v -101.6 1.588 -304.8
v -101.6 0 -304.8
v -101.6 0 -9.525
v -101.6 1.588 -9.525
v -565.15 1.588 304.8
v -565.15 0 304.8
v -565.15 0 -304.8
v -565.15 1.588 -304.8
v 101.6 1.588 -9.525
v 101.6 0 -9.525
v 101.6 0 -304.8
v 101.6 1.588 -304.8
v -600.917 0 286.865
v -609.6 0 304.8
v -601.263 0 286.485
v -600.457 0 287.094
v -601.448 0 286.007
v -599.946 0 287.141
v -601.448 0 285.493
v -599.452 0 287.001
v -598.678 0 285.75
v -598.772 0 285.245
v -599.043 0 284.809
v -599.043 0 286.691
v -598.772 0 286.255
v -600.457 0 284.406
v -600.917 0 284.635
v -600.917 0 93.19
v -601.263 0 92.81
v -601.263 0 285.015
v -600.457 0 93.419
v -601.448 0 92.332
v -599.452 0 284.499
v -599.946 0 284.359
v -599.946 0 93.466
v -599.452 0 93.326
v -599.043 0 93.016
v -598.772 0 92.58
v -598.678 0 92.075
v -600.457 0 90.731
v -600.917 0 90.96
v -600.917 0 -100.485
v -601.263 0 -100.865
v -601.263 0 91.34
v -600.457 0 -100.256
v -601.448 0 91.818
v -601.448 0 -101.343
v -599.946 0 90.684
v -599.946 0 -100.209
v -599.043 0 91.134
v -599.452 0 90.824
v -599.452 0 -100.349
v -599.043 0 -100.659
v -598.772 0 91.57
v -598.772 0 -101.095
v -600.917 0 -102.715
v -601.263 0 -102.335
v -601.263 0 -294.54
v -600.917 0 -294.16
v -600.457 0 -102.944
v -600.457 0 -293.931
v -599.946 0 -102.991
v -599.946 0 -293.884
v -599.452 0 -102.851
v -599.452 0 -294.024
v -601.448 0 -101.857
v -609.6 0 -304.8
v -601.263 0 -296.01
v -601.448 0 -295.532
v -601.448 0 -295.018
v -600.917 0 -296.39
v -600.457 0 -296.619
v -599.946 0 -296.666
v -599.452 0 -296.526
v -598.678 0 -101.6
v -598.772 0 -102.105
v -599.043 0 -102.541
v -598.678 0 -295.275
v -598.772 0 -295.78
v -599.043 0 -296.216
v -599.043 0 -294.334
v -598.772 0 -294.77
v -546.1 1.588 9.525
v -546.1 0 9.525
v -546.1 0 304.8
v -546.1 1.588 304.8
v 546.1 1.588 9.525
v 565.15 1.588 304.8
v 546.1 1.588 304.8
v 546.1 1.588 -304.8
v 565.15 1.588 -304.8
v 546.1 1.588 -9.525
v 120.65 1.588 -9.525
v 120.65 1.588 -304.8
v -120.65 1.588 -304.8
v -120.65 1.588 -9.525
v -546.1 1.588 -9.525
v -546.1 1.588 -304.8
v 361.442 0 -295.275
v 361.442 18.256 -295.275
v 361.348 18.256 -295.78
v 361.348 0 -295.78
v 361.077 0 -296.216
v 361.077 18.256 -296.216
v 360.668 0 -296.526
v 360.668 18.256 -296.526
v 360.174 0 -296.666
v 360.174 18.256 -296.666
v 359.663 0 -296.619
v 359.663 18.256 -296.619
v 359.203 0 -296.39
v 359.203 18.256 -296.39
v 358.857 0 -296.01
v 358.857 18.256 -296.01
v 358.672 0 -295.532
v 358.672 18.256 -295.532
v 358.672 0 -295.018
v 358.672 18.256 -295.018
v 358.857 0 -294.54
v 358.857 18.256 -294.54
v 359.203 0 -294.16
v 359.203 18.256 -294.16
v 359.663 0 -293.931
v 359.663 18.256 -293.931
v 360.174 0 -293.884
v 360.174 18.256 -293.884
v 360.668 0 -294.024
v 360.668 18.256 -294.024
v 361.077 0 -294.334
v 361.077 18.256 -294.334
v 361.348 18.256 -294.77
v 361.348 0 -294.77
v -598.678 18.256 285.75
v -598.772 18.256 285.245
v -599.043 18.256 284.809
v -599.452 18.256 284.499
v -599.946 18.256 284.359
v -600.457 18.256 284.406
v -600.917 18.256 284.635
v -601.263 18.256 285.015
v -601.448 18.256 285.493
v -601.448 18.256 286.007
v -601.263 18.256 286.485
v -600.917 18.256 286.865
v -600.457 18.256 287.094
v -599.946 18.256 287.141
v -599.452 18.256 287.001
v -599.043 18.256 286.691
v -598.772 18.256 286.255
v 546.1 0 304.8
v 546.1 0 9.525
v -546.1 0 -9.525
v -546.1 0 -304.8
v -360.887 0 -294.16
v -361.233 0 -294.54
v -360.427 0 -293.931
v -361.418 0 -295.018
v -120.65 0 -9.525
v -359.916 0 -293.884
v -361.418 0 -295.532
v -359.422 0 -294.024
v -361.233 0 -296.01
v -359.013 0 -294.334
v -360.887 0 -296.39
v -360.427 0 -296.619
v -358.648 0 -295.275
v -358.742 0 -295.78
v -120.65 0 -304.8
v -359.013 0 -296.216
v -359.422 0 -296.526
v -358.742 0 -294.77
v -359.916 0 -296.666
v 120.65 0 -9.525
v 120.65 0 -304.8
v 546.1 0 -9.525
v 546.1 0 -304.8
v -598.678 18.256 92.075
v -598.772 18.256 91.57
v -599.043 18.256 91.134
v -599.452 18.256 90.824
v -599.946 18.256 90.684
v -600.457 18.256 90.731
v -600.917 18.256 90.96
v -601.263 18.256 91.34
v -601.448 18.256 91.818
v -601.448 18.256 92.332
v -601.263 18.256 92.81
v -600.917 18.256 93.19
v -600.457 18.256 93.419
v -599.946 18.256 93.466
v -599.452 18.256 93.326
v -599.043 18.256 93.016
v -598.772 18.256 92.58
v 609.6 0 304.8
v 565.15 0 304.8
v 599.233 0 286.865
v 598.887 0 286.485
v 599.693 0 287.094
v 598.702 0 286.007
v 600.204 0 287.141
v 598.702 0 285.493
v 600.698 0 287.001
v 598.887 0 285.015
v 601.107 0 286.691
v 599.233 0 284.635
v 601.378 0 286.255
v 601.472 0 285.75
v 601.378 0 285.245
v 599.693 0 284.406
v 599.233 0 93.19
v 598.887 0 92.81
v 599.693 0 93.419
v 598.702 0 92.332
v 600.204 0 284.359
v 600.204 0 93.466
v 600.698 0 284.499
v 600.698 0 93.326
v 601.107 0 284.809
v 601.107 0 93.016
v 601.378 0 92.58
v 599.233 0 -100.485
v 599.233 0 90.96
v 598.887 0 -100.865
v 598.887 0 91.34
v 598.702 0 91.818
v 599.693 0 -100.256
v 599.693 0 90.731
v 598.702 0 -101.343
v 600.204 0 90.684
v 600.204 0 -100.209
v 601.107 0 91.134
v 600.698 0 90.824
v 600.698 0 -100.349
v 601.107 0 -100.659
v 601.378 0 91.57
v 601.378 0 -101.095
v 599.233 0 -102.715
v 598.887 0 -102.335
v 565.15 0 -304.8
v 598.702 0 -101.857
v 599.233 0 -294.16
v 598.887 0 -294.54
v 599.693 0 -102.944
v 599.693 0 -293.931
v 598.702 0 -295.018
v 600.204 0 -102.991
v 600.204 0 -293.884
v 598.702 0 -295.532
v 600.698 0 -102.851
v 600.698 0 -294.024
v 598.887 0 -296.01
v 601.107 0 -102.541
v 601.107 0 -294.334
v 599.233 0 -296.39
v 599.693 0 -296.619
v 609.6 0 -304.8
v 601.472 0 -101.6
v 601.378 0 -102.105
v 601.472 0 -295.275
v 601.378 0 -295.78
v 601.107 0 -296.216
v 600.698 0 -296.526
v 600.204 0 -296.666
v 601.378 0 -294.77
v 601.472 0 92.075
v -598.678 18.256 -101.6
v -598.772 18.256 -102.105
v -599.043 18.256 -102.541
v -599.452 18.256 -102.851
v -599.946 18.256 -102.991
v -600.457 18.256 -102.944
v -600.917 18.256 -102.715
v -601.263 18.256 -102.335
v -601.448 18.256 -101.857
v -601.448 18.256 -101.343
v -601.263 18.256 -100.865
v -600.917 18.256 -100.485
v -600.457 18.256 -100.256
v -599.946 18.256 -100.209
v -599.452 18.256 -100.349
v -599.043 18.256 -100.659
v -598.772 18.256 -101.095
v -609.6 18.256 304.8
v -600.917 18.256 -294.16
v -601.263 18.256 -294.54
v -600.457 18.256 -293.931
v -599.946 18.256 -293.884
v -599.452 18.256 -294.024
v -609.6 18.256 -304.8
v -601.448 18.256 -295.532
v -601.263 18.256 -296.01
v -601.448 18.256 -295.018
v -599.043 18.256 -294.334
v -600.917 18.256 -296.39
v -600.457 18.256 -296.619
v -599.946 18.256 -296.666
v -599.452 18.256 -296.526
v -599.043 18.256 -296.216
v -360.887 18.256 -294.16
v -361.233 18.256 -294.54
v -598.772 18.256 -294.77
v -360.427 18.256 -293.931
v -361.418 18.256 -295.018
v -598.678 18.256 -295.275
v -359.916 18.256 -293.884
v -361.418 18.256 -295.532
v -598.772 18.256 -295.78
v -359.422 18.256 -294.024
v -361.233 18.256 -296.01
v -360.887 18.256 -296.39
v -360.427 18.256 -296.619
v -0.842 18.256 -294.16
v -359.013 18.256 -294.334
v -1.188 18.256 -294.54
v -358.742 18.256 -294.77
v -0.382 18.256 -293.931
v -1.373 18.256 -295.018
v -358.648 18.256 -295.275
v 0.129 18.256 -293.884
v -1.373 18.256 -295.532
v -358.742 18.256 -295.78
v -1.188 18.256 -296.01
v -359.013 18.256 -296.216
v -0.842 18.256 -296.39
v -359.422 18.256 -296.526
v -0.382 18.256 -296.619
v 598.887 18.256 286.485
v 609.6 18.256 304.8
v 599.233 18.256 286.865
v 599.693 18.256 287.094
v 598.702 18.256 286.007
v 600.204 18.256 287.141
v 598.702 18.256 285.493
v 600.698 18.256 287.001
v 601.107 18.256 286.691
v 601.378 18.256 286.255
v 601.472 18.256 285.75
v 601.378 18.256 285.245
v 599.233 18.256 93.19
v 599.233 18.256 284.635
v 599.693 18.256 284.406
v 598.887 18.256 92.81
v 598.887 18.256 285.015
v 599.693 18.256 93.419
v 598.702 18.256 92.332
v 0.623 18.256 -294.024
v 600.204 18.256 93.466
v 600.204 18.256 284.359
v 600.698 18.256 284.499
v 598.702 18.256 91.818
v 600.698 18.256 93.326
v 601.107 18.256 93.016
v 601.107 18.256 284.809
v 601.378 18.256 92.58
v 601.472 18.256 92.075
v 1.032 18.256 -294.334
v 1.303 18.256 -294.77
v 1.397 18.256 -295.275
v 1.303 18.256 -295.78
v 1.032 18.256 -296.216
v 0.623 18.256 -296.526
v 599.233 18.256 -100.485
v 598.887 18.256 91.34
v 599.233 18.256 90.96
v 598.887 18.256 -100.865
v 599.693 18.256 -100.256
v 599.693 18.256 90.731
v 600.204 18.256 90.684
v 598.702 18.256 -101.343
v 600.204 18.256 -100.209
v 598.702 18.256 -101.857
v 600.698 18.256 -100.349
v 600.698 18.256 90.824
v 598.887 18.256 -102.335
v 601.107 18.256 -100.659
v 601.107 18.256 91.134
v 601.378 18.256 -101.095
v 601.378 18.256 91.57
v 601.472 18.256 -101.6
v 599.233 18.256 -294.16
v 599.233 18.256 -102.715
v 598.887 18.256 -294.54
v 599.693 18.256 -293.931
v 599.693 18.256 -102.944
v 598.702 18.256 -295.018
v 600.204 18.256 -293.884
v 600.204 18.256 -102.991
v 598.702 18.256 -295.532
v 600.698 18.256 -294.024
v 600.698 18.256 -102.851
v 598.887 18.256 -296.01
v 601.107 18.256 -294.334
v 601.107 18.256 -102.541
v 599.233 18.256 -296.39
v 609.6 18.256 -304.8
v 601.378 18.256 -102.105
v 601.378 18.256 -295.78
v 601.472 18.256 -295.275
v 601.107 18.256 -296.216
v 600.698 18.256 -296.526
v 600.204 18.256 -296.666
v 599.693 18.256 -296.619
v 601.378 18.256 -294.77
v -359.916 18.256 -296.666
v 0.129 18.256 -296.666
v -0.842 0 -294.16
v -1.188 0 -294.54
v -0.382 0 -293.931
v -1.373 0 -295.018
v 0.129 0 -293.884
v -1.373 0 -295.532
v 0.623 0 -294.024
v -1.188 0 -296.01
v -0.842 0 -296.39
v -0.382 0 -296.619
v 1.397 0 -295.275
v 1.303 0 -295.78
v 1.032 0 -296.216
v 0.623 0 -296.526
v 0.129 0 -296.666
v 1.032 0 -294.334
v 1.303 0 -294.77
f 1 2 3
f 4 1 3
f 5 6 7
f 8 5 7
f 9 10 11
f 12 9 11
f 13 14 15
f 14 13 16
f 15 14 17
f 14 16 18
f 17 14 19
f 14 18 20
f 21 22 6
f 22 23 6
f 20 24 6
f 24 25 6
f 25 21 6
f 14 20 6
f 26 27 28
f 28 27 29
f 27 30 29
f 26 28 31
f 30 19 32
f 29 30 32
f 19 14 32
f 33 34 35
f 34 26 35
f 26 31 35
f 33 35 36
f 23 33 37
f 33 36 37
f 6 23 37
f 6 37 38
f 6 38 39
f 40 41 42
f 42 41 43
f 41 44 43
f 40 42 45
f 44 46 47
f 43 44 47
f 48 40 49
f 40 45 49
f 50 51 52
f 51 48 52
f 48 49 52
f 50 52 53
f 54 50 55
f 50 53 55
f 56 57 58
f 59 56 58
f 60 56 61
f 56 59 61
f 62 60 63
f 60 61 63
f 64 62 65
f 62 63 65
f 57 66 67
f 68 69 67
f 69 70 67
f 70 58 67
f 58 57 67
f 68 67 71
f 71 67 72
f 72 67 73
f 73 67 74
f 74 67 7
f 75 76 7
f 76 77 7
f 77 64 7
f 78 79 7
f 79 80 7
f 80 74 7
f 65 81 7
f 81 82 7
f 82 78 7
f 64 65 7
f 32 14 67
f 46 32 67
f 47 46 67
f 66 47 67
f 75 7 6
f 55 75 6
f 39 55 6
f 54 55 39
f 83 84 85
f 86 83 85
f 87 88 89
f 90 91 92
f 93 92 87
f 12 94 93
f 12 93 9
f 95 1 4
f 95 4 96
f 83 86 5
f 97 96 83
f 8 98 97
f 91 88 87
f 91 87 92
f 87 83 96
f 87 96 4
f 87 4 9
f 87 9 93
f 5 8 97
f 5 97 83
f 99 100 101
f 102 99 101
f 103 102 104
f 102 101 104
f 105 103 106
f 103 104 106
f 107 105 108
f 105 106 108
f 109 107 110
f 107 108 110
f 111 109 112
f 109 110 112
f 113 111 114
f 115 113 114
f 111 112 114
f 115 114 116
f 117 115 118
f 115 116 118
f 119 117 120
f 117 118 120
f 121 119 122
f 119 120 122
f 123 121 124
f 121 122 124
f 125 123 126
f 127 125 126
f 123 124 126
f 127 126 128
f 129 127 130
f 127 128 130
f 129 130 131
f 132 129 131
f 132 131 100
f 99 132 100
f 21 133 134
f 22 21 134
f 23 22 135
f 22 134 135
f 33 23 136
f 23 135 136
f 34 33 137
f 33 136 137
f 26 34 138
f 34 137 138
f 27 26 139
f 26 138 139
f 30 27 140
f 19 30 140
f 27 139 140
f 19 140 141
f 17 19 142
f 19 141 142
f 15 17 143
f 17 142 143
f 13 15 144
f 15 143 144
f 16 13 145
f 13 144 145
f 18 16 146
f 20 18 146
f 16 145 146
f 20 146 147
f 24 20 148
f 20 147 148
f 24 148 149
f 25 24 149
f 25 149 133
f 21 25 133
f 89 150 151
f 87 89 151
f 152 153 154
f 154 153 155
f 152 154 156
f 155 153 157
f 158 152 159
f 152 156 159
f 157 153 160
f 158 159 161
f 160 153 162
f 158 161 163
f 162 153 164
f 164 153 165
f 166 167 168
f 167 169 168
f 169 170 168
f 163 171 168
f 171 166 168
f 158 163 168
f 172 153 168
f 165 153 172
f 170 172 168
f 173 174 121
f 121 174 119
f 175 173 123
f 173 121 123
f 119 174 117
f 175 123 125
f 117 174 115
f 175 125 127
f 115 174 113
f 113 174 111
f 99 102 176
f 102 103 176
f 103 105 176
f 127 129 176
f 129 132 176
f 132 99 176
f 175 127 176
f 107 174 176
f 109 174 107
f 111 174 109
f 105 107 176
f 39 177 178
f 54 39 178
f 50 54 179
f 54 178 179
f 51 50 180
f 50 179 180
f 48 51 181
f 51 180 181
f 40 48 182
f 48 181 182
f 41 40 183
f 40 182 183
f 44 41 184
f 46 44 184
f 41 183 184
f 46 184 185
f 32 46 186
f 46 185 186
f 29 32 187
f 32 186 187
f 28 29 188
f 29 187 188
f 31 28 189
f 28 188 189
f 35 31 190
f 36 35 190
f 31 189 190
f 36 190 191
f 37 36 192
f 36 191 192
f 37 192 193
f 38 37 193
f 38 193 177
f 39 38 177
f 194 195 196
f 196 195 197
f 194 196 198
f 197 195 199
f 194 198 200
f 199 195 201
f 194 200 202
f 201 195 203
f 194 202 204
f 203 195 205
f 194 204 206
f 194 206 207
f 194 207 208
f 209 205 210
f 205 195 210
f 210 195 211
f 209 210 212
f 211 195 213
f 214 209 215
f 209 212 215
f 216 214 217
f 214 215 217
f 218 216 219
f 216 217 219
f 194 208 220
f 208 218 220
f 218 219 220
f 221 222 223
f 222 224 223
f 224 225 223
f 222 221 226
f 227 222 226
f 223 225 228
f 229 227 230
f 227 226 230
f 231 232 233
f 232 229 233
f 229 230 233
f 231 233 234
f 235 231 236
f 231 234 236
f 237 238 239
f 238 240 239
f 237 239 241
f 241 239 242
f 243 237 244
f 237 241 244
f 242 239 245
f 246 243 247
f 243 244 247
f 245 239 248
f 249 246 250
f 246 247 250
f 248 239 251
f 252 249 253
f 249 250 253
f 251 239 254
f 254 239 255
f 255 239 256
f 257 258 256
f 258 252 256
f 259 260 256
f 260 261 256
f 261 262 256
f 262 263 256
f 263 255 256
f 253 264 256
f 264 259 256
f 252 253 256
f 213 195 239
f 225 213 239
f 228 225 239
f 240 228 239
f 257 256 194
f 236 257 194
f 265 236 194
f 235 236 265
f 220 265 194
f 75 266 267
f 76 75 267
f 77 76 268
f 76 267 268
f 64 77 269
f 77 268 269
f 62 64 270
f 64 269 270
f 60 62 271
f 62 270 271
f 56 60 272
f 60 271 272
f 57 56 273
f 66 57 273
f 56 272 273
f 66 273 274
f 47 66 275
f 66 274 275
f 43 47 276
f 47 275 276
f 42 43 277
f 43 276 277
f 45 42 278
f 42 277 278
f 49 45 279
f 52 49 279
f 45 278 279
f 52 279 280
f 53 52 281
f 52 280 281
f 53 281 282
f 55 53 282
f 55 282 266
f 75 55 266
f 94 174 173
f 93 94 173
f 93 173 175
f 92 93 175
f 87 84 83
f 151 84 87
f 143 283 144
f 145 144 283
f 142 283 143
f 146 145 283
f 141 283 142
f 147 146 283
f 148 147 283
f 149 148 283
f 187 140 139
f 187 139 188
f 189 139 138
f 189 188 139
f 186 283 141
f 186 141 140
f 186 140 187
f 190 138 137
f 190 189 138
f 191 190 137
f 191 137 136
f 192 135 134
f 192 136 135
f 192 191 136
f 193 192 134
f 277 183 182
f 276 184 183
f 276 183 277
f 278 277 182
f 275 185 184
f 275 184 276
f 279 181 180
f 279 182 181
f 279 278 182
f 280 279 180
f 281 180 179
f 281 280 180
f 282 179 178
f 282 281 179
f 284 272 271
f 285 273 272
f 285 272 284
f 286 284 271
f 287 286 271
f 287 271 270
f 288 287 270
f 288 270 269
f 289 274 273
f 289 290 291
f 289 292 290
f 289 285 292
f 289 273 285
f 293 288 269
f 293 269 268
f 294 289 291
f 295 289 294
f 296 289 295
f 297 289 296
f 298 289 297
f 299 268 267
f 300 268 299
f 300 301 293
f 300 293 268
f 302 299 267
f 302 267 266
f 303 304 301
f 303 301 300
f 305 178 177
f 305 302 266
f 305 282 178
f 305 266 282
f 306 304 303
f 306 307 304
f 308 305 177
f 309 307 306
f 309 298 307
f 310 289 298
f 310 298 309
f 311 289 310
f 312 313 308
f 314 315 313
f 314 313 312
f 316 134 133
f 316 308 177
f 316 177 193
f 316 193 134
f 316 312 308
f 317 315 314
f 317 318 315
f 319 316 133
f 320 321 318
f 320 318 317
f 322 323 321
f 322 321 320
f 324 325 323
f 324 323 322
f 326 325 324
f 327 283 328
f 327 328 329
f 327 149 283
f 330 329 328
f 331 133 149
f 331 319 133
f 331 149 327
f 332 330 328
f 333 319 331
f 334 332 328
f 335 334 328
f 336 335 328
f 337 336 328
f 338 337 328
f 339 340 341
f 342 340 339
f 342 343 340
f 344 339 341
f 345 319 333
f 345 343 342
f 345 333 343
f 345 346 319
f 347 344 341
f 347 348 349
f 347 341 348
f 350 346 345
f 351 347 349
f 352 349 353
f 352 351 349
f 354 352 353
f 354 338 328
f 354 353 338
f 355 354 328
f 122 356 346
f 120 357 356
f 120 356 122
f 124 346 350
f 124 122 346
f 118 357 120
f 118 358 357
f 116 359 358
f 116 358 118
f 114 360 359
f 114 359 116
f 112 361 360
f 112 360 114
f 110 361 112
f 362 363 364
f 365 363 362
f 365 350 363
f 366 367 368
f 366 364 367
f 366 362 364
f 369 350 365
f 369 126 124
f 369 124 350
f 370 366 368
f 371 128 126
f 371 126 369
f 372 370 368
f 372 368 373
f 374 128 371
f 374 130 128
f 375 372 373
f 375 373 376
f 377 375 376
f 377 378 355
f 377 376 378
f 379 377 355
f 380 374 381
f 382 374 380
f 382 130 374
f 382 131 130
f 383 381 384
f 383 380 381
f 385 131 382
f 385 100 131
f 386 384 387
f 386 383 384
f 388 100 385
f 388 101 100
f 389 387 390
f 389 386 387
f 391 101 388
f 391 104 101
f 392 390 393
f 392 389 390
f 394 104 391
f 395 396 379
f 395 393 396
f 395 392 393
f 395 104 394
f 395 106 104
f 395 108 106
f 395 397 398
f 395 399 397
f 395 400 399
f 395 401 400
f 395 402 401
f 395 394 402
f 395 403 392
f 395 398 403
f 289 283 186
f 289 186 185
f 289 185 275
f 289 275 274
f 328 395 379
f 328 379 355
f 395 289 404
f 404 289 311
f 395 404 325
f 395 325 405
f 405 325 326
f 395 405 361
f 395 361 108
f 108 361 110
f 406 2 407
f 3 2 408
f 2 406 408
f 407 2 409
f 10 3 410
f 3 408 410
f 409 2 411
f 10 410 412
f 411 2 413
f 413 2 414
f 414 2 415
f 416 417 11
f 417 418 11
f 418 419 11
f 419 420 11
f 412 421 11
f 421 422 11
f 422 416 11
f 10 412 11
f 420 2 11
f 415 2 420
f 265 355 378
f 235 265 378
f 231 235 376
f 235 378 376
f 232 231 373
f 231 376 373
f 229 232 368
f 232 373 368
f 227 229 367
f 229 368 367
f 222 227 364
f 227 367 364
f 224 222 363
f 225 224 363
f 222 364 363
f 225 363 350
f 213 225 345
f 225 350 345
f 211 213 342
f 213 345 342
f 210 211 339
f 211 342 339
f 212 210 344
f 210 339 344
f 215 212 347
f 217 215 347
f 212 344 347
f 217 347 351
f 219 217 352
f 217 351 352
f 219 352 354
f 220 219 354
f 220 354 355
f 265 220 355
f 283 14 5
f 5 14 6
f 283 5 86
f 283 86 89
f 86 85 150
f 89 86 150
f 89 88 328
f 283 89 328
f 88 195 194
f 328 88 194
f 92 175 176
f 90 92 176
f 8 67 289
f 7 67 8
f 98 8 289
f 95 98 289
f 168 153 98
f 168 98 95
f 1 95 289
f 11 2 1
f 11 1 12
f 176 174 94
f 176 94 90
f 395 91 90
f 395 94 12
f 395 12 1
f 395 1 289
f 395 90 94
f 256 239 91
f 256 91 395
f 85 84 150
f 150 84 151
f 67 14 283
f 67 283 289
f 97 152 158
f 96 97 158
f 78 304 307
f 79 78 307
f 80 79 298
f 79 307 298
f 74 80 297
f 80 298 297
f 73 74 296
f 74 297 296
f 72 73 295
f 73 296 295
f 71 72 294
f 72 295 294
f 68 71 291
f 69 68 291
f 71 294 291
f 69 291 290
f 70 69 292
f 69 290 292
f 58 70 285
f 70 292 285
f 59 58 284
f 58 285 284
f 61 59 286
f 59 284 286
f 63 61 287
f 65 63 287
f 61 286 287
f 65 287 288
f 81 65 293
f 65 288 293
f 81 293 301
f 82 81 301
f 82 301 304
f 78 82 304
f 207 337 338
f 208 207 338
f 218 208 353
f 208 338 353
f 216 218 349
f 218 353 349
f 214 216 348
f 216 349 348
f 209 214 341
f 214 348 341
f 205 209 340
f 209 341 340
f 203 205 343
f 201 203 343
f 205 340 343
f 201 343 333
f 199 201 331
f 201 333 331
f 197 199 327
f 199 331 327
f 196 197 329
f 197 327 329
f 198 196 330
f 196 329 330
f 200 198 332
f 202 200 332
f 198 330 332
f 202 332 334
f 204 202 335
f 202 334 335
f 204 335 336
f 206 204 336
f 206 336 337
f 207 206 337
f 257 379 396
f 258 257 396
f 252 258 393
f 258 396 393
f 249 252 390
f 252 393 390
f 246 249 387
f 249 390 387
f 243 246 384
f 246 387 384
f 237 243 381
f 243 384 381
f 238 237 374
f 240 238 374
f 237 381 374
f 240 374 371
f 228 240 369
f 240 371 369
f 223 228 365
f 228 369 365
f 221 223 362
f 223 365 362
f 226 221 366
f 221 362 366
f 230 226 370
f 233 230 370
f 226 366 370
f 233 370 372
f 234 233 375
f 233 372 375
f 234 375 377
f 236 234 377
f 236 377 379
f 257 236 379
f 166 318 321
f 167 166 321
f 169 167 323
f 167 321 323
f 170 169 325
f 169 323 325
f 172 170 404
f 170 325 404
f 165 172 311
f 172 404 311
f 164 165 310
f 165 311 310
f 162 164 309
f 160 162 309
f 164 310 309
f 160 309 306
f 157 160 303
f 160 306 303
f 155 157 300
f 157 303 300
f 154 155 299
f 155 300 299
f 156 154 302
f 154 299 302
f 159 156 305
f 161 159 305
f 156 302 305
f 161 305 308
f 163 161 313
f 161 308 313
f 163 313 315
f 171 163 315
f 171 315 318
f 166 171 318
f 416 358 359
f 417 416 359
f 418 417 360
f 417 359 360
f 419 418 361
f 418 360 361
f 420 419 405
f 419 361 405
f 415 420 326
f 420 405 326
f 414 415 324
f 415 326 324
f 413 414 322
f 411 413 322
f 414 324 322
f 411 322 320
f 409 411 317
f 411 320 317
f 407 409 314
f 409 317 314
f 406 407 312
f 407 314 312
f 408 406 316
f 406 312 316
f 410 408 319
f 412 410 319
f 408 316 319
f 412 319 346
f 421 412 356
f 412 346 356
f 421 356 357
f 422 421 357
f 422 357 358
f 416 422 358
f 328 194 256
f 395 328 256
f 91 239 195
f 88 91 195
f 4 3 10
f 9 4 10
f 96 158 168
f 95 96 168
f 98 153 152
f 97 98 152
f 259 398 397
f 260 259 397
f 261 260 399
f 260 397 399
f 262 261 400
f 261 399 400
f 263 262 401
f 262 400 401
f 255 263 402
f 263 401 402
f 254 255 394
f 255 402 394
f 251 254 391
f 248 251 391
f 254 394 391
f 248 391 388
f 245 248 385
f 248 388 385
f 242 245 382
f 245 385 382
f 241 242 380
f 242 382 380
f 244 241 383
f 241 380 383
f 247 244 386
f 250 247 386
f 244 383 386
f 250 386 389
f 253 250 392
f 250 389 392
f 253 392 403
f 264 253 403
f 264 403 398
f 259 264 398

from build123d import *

# Parameters (mm, degrees)
SKETCH1_W           = 1219.2
SKETCH1_H           = 609.6
BOSS_EXTRUDE1_DEPTH = 18.25625
CUT_EXTRUDE1_DEPTH  = 1.5875
SKETCH8_R           = 1.397
CUT_EXTRUDE2_DEPTH  = 19.25625


with BuildPart() as part:
    # Sketch1 → Boss-Extrude1 (new body)
    with BuildSketch(Plane(origin=(0, 0, 0), x_dir=(1, 0, 0), z_dir=(0, 1, 0))):
        Rectangle(SKETCH1_W, SKETCH1_H)
    extrude(amount=BOSS_EXTRUDE1_DEPTH)

    # Sketch2 → Cut-Extrude1 (cut)
    with BuildSketch(Plane(origin=(0, 0, 0), x_dir=(1, 0, 0), z_dir=(0, 1, 0))):
        Polygon((-565.15, 304.8), (-546.1, 304.8), (-546.1, 9.525), (-120.65, 9.525), (-120.65, 304.8), (-101.6, 304.8), (-101.6, 9.525), (101.6, 9.525), (101.6, 304.8), (120.65, 304.8), (120.65, 9.525), (546.1, 9.525), (546.1, 304.8), (565.15, 304.8), (565.15, -304.8), (546.1, -304.8), (546.1, -9.525), (120.65, -9.525), (101.6, -9.525), (-101.6, -9.525), (-120.65, -9.525), (-546.1, -9.525), (-546.1, -304.8), (-565.15, -304.8), align=None)
    extrude(amount=CUT_EXTRUDE1_DEPTH, mode=Mode.SUBTRACT)

    # Sketch8 → Cut-Extrude2 (cut, through all)
    with BuildSketch(Plane(origin=(0, 18.25625, 0), x_dir=(1, 0, 0), z_dir=(0, 1, 0))):
        with Locations((-600.075, -285.75)):
            Circle(SKETCH8_R)
        with Locations((600.075, -285.75)):
            Circle(SKETCH8_R)
        with Locations((600.075, -92.075)):
            Circle(SKETCH8_R)
        with Locations((600.075, 101.6)):
            Circle(SKETCH8_R)
        with Locations((-360.045, 295.275)):
            Circle(SKETCH8_R)
        with Locations((0, 295.275)):
            Circle(SKETCH8_R)
        with Locations((360.045, 295.275)):
            Circle(SKETCH8_R)
        with Locations((600.075, 295.275)):
            Circle(SKETCH8_R)
        with Locations((-600.075, -92.075)):
            Circle(SKETCH8_R)
        with Locations((-600.075, 101.6)):
            Circle(SKETCH8_R)
        with Locations((-600.075, 295.275)):
            Circle(SKETCH8_R)
    extrude(amount=-CUT_EXTRUDE2_DEPTH, mode=Mode.SUBTRACT)


solid = part.part
